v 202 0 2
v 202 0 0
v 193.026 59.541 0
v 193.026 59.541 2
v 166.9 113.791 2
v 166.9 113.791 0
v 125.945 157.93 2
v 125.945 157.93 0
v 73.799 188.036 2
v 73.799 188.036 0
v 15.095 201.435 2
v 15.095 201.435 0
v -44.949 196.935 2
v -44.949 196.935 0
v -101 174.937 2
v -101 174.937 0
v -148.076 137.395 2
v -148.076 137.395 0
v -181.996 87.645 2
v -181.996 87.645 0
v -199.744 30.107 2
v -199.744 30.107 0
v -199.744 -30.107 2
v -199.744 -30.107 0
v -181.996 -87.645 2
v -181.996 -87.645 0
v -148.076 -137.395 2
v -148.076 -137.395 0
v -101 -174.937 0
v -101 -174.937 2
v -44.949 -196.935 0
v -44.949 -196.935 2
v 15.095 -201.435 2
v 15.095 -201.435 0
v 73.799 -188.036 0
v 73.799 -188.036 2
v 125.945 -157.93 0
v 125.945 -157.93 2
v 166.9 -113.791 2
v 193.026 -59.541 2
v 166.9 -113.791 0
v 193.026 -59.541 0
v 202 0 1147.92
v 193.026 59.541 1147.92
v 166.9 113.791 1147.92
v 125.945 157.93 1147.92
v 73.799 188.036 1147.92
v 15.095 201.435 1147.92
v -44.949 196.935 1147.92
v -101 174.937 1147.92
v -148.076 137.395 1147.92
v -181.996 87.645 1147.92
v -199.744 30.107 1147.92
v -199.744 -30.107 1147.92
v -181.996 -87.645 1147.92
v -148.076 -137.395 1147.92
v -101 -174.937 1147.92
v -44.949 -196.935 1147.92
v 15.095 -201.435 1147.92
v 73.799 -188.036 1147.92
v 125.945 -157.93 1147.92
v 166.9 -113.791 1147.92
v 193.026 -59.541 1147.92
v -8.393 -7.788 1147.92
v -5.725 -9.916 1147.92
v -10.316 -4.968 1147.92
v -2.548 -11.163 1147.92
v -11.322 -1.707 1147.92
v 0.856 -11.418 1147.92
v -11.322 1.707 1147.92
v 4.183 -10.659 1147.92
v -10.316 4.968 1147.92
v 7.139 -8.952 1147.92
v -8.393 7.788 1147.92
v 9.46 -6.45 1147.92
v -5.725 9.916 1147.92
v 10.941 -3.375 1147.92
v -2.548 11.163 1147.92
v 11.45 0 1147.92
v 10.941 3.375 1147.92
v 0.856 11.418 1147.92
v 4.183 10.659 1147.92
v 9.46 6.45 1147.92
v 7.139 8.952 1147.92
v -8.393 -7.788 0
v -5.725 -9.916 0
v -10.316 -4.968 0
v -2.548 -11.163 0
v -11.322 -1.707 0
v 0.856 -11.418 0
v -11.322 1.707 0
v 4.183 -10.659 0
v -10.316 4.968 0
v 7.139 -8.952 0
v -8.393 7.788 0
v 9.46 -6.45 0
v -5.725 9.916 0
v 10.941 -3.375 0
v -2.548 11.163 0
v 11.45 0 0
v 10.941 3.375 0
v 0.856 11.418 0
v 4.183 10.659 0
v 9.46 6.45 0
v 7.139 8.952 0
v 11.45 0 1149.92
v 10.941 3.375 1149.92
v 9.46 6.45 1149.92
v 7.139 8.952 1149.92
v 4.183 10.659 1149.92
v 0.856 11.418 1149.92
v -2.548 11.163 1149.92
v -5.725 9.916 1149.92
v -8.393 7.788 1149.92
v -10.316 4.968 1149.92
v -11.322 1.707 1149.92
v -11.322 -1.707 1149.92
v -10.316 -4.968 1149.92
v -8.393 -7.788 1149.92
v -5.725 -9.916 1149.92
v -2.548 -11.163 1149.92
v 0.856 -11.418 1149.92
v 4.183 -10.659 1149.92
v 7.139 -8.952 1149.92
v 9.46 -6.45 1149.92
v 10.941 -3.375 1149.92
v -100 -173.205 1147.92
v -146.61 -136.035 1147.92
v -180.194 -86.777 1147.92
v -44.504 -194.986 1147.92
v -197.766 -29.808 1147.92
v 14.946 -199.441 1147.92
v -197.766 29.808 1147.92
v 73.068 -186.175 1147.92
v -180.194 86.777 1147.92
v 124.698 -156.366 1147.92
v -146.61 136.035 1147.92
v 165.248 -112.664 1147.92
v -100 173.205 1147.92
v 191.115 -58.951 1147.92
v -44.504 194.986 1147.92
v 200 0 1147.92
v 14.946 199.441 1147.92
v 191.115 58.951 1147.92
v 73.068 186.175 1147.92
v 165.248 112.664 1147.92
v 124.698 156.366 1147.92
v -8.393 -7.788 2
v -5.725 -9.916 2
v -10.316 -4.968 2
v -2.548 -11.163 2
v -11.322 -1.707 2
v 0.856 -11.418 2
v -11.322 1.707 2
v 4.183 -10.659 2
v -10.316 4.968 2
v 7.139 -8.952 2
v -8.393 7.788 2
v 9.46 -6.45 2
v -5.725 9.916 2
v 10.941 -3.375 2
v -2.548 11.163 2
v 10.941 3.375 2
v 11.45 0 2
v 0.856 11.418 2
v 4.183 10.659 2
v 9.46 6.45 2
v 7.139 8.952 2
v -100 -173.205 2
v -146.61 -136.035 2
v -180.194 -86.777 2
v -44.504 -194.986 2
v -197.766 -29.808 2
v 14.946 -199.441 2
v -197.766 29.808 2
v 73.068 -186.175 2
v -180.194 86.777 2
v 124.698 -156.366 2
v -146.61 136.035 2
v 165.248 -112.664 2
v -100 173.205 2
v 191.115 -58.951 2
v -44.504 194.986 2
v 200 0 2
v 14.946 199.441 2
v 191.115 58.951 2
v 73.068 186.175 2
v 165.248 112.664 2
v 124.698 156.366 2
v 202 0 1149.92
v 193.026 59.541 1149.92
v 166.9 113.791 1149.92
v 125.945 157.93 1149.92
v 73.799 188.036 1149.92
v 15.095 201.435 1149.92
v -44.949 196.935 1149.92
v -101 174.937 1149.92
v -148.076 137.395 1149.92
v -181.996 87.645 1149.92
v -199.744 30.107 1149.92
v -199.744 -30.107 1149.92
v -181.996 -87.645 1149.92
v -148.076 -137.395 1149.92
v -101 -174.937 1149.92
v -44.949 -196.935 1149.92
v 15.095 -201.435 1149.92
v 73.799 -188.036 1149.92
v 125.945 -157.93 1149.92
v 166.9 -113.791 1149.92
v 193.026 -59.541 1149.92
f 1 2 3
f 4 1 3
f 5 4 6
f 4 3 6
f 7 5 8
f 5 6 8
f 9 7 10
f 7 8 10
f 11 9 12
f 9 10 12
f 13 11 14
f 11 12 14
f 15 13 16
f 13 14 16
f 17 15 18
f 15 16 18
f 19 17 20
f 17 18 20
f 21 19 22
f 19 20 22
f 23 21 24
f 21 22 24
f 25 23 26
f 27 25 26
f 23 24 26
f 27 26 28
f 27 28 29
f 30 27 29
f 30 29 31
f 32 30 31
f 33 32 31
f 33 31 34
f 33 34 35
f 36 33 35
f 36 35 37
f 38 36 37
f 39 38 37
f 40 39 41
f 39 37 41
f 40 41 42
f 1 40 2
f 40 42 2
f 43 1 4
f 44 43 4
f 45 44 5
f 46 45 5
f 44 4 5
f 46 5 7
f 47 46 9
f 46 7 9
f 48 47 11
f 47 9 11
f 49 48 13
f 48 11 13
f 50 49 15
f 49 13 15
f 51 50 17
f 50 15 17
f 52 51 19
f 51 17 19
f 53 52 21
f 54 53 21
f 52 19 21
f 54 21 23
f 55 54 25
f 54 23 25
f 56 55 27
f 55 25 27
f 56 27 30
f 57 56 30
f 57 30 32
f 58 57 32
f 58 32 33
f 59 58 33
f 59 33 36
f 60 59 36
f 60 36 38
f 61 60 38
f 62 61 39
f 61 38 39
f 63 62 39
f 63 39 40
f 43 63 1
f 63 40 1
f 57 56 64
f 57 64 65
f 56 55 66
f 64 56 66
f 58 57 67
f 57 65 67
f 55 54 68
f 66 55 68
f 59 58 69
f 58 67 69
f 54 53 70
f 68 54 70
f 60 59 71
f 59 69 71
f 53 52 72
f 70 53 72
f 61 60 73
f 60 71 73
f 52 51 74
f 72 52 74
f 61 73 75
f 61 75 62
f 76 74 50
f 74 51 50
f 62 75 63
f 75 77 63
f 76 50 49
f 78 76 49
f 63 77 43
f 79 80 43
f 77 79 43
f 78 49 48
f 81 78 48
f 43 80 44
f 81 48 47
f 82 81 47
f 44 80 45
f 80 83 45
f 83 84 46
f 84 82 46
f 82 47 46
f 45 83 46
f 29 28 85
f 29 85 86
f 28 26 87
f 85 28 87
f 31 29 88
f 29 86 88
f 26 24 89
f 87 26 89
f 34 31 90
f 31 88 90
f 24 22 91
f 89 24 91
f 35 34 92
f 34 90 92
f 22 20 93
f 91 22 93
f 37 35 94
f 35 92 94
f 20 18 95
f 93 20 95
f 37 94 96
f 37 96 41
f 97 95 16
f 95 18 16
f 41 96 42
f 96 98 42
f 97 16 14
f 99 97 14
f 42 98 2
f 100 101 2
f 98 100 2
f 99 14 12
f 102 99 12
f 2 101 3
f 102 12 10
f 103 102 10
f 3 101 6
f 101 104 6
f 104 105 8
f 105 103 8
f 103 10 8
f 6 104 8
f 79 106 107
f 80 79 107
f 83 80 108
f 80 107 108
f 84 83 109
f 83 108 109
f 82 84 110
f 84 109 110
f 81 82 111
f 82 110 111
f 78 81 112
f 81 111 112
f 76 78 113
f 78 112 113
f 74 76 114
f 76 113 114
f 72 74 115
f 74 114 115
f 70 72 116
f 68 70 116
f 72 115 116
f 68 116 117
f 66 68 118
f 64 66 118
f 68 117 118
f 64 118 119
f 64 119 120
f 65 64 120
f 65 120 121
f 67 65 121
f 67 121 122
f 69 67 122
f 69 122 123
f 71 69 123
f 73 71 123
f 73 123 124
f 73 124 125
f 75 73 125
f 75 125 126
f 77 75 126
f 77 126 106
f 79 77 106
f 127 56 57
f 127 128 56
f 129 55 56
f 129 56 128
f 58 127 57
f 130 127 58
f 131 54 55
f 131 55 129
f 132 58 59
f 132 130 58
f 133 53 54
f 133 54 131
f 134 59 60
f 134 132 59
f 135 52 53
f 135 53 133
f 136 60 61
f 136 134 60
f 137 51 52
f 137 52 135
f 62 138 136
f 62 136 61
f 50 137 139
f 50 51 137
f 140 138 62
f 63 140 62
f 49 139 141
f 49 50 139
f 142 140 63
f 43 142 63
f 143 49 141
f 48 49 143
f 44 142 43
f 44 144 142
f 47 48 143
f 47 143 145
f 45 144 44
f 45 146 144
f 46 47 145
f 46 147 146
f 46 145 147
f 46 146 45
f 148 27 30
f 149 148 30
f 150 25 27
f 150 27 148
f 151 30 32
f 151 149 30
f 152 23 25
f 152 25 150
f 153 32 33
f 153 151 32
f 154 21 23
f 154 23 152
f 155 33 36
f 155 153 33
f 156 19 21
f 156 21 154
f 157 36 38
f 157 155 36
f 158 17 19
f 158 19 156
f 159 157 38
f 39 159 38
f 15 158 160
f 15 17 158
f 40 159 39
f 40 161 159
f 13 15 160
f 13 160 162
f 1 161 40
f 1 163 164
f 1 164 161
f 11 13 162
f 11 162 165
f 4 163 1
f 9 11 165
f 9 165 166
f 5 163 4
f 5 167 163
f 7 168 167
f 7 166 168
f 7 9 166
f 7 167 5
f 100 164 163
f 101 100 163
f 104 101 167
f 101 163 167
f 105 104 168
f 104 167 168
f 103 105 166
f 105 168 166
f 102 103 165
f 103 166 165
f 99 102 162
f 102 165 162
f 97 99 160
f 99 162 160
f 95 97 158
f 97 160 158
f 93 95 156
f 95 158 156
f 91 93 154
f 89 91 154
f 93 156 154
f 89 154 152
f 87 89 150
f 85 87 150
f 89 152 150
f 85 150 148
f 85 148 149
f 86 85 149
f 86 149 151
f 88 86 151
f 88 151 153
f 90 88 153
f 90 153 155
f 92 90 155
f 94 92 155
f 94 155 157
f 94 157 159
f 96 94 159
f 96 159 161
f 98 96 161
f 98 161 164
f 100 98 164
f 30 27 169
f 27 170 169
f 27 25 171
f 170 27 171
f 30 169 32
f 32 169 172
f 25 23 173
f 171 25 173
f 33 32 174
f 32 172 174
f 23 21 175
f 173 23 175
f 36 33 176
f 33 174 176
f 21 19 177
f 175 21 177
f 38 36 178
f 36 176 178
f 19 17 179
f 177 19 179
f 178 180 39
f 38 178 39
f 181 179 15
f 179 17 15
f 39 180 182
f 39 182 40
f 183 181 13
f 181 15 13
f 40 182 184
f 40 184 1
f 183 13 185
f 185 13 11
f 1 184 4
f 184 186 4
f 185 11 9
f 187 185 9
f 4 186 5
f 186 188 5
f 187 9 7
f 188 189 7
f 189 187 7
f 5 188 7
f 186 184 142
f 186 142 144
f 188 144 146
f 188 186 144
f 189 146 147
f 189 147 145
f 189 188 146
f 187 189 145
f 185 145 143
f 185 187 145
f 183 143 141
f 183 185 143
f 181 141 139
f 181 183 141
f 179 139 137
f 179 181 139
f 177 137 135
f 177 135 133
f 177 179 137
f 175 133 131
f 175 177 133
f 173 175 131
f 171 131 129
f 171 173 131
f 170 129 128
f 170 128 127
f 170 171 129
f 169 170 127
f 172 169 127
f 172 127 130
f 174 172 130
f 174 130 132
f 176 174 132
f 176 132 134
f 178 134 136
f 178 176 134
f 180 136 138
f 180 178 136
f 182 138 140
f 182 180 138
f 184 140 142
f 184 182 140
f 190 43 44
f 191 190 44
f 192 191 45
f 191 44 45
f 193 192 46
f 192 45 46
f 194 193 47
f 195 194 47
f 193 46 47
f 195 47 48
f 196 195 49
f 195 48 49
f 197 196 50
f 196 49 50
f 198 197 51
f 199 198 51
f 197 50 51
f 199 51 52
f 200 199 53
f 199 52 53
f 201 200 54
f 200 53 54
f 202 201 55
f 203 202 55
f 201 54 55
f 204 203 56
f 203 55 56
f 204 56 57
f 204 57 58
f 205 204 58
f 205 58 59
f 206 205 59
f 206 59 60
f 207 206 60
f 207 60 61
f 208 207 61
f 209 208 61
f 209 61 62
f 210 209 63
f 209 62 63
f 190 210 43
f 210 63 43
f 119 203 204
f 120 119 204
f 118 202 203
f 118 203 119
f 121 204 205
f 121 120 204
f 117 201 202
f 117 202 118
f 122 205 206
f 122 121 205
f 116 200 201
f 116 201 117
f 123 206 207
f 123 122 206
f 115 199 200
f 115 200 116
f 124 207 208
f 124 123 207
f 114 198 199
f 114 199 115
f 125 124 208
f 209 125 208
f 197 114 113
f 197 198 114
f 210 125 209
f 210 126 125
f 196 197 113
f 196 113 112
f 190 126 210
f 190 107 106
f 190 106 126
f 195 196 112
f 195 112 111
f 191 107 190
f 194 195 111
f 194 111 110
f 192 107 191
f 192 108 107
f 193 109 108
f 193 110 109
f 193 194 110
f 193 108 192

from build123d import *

# Parameters (mm, degrees)
SKETCH1_R           = 202
BOSS_EXTRUDE1_DEPTH = 2
SKETCH2_R           = 202
SKETCH2_R_2         = 200
BOSS_EXTRUDE2_DEPTH = 1145.92
SKETCH4_R           = 202
BOSS_EXTRUDE4_DEPTH = 2
SKETCH5_R           = 11.45
CUT_EXTRUDE1_DEPTH  = 1185.872991675


with BuildPart() as part:
    # Sketch1 → Boss-Extrude1 (new body)
    with BuildSketch(Plane.XY):
        Circle(SKETCH1_R)
    extrude(amount=BOSS_EXTRUDE1_DEPTH)


with BuildPart() as body_2:
    # Sketch2 → Boss-Extrude2 (new body)
    with BuildSketch(Plane.XY.offset(2)):
        Circle(SKETCH2_R)
        Circle(SKETCH2_R_2, mode=Mode.SUBTRACT)
    extrude(amount=BOSS_EXTRUDE2_DEPTH)


with BuildPart() as body_3:
    # Sketch4 → Boss-Extrude4 (new body)
    with BuildSketch(Plane.XY.offset(1147.92)):
        Circle(SKETCH4_R)
    extrude(amount=BOSS_EXTRUDE4_DEPTH)


with BuildPart() as cut_extrude1_tool:
    # Sketch5 → Cut-Extrude1 (new, through all)
    with BuildSketch(Plane.XY.offset(1149.92)):
        Circle(SKETCH5_R)
    extrude(amount=-CUT_EXTRUDE1_DEPTH)


with BuildPart() as part_1:
    add(part.part)

    # Cut-Extrude1: cut by cut_extrude1_tool
    add(cut_extrude1_tool.part, mode=Mode.SUBTRACT)


with BuildPart() as body_3_1:
    add(body_3.part)

    # Cut-Extrude1: cut by cut_extrude1_tool
    add(cut_extrude1_tool.part, mode=Mode.SUBTRACT)


solid = Compound([body_2.part, part_1.part, body_3_1.part])
